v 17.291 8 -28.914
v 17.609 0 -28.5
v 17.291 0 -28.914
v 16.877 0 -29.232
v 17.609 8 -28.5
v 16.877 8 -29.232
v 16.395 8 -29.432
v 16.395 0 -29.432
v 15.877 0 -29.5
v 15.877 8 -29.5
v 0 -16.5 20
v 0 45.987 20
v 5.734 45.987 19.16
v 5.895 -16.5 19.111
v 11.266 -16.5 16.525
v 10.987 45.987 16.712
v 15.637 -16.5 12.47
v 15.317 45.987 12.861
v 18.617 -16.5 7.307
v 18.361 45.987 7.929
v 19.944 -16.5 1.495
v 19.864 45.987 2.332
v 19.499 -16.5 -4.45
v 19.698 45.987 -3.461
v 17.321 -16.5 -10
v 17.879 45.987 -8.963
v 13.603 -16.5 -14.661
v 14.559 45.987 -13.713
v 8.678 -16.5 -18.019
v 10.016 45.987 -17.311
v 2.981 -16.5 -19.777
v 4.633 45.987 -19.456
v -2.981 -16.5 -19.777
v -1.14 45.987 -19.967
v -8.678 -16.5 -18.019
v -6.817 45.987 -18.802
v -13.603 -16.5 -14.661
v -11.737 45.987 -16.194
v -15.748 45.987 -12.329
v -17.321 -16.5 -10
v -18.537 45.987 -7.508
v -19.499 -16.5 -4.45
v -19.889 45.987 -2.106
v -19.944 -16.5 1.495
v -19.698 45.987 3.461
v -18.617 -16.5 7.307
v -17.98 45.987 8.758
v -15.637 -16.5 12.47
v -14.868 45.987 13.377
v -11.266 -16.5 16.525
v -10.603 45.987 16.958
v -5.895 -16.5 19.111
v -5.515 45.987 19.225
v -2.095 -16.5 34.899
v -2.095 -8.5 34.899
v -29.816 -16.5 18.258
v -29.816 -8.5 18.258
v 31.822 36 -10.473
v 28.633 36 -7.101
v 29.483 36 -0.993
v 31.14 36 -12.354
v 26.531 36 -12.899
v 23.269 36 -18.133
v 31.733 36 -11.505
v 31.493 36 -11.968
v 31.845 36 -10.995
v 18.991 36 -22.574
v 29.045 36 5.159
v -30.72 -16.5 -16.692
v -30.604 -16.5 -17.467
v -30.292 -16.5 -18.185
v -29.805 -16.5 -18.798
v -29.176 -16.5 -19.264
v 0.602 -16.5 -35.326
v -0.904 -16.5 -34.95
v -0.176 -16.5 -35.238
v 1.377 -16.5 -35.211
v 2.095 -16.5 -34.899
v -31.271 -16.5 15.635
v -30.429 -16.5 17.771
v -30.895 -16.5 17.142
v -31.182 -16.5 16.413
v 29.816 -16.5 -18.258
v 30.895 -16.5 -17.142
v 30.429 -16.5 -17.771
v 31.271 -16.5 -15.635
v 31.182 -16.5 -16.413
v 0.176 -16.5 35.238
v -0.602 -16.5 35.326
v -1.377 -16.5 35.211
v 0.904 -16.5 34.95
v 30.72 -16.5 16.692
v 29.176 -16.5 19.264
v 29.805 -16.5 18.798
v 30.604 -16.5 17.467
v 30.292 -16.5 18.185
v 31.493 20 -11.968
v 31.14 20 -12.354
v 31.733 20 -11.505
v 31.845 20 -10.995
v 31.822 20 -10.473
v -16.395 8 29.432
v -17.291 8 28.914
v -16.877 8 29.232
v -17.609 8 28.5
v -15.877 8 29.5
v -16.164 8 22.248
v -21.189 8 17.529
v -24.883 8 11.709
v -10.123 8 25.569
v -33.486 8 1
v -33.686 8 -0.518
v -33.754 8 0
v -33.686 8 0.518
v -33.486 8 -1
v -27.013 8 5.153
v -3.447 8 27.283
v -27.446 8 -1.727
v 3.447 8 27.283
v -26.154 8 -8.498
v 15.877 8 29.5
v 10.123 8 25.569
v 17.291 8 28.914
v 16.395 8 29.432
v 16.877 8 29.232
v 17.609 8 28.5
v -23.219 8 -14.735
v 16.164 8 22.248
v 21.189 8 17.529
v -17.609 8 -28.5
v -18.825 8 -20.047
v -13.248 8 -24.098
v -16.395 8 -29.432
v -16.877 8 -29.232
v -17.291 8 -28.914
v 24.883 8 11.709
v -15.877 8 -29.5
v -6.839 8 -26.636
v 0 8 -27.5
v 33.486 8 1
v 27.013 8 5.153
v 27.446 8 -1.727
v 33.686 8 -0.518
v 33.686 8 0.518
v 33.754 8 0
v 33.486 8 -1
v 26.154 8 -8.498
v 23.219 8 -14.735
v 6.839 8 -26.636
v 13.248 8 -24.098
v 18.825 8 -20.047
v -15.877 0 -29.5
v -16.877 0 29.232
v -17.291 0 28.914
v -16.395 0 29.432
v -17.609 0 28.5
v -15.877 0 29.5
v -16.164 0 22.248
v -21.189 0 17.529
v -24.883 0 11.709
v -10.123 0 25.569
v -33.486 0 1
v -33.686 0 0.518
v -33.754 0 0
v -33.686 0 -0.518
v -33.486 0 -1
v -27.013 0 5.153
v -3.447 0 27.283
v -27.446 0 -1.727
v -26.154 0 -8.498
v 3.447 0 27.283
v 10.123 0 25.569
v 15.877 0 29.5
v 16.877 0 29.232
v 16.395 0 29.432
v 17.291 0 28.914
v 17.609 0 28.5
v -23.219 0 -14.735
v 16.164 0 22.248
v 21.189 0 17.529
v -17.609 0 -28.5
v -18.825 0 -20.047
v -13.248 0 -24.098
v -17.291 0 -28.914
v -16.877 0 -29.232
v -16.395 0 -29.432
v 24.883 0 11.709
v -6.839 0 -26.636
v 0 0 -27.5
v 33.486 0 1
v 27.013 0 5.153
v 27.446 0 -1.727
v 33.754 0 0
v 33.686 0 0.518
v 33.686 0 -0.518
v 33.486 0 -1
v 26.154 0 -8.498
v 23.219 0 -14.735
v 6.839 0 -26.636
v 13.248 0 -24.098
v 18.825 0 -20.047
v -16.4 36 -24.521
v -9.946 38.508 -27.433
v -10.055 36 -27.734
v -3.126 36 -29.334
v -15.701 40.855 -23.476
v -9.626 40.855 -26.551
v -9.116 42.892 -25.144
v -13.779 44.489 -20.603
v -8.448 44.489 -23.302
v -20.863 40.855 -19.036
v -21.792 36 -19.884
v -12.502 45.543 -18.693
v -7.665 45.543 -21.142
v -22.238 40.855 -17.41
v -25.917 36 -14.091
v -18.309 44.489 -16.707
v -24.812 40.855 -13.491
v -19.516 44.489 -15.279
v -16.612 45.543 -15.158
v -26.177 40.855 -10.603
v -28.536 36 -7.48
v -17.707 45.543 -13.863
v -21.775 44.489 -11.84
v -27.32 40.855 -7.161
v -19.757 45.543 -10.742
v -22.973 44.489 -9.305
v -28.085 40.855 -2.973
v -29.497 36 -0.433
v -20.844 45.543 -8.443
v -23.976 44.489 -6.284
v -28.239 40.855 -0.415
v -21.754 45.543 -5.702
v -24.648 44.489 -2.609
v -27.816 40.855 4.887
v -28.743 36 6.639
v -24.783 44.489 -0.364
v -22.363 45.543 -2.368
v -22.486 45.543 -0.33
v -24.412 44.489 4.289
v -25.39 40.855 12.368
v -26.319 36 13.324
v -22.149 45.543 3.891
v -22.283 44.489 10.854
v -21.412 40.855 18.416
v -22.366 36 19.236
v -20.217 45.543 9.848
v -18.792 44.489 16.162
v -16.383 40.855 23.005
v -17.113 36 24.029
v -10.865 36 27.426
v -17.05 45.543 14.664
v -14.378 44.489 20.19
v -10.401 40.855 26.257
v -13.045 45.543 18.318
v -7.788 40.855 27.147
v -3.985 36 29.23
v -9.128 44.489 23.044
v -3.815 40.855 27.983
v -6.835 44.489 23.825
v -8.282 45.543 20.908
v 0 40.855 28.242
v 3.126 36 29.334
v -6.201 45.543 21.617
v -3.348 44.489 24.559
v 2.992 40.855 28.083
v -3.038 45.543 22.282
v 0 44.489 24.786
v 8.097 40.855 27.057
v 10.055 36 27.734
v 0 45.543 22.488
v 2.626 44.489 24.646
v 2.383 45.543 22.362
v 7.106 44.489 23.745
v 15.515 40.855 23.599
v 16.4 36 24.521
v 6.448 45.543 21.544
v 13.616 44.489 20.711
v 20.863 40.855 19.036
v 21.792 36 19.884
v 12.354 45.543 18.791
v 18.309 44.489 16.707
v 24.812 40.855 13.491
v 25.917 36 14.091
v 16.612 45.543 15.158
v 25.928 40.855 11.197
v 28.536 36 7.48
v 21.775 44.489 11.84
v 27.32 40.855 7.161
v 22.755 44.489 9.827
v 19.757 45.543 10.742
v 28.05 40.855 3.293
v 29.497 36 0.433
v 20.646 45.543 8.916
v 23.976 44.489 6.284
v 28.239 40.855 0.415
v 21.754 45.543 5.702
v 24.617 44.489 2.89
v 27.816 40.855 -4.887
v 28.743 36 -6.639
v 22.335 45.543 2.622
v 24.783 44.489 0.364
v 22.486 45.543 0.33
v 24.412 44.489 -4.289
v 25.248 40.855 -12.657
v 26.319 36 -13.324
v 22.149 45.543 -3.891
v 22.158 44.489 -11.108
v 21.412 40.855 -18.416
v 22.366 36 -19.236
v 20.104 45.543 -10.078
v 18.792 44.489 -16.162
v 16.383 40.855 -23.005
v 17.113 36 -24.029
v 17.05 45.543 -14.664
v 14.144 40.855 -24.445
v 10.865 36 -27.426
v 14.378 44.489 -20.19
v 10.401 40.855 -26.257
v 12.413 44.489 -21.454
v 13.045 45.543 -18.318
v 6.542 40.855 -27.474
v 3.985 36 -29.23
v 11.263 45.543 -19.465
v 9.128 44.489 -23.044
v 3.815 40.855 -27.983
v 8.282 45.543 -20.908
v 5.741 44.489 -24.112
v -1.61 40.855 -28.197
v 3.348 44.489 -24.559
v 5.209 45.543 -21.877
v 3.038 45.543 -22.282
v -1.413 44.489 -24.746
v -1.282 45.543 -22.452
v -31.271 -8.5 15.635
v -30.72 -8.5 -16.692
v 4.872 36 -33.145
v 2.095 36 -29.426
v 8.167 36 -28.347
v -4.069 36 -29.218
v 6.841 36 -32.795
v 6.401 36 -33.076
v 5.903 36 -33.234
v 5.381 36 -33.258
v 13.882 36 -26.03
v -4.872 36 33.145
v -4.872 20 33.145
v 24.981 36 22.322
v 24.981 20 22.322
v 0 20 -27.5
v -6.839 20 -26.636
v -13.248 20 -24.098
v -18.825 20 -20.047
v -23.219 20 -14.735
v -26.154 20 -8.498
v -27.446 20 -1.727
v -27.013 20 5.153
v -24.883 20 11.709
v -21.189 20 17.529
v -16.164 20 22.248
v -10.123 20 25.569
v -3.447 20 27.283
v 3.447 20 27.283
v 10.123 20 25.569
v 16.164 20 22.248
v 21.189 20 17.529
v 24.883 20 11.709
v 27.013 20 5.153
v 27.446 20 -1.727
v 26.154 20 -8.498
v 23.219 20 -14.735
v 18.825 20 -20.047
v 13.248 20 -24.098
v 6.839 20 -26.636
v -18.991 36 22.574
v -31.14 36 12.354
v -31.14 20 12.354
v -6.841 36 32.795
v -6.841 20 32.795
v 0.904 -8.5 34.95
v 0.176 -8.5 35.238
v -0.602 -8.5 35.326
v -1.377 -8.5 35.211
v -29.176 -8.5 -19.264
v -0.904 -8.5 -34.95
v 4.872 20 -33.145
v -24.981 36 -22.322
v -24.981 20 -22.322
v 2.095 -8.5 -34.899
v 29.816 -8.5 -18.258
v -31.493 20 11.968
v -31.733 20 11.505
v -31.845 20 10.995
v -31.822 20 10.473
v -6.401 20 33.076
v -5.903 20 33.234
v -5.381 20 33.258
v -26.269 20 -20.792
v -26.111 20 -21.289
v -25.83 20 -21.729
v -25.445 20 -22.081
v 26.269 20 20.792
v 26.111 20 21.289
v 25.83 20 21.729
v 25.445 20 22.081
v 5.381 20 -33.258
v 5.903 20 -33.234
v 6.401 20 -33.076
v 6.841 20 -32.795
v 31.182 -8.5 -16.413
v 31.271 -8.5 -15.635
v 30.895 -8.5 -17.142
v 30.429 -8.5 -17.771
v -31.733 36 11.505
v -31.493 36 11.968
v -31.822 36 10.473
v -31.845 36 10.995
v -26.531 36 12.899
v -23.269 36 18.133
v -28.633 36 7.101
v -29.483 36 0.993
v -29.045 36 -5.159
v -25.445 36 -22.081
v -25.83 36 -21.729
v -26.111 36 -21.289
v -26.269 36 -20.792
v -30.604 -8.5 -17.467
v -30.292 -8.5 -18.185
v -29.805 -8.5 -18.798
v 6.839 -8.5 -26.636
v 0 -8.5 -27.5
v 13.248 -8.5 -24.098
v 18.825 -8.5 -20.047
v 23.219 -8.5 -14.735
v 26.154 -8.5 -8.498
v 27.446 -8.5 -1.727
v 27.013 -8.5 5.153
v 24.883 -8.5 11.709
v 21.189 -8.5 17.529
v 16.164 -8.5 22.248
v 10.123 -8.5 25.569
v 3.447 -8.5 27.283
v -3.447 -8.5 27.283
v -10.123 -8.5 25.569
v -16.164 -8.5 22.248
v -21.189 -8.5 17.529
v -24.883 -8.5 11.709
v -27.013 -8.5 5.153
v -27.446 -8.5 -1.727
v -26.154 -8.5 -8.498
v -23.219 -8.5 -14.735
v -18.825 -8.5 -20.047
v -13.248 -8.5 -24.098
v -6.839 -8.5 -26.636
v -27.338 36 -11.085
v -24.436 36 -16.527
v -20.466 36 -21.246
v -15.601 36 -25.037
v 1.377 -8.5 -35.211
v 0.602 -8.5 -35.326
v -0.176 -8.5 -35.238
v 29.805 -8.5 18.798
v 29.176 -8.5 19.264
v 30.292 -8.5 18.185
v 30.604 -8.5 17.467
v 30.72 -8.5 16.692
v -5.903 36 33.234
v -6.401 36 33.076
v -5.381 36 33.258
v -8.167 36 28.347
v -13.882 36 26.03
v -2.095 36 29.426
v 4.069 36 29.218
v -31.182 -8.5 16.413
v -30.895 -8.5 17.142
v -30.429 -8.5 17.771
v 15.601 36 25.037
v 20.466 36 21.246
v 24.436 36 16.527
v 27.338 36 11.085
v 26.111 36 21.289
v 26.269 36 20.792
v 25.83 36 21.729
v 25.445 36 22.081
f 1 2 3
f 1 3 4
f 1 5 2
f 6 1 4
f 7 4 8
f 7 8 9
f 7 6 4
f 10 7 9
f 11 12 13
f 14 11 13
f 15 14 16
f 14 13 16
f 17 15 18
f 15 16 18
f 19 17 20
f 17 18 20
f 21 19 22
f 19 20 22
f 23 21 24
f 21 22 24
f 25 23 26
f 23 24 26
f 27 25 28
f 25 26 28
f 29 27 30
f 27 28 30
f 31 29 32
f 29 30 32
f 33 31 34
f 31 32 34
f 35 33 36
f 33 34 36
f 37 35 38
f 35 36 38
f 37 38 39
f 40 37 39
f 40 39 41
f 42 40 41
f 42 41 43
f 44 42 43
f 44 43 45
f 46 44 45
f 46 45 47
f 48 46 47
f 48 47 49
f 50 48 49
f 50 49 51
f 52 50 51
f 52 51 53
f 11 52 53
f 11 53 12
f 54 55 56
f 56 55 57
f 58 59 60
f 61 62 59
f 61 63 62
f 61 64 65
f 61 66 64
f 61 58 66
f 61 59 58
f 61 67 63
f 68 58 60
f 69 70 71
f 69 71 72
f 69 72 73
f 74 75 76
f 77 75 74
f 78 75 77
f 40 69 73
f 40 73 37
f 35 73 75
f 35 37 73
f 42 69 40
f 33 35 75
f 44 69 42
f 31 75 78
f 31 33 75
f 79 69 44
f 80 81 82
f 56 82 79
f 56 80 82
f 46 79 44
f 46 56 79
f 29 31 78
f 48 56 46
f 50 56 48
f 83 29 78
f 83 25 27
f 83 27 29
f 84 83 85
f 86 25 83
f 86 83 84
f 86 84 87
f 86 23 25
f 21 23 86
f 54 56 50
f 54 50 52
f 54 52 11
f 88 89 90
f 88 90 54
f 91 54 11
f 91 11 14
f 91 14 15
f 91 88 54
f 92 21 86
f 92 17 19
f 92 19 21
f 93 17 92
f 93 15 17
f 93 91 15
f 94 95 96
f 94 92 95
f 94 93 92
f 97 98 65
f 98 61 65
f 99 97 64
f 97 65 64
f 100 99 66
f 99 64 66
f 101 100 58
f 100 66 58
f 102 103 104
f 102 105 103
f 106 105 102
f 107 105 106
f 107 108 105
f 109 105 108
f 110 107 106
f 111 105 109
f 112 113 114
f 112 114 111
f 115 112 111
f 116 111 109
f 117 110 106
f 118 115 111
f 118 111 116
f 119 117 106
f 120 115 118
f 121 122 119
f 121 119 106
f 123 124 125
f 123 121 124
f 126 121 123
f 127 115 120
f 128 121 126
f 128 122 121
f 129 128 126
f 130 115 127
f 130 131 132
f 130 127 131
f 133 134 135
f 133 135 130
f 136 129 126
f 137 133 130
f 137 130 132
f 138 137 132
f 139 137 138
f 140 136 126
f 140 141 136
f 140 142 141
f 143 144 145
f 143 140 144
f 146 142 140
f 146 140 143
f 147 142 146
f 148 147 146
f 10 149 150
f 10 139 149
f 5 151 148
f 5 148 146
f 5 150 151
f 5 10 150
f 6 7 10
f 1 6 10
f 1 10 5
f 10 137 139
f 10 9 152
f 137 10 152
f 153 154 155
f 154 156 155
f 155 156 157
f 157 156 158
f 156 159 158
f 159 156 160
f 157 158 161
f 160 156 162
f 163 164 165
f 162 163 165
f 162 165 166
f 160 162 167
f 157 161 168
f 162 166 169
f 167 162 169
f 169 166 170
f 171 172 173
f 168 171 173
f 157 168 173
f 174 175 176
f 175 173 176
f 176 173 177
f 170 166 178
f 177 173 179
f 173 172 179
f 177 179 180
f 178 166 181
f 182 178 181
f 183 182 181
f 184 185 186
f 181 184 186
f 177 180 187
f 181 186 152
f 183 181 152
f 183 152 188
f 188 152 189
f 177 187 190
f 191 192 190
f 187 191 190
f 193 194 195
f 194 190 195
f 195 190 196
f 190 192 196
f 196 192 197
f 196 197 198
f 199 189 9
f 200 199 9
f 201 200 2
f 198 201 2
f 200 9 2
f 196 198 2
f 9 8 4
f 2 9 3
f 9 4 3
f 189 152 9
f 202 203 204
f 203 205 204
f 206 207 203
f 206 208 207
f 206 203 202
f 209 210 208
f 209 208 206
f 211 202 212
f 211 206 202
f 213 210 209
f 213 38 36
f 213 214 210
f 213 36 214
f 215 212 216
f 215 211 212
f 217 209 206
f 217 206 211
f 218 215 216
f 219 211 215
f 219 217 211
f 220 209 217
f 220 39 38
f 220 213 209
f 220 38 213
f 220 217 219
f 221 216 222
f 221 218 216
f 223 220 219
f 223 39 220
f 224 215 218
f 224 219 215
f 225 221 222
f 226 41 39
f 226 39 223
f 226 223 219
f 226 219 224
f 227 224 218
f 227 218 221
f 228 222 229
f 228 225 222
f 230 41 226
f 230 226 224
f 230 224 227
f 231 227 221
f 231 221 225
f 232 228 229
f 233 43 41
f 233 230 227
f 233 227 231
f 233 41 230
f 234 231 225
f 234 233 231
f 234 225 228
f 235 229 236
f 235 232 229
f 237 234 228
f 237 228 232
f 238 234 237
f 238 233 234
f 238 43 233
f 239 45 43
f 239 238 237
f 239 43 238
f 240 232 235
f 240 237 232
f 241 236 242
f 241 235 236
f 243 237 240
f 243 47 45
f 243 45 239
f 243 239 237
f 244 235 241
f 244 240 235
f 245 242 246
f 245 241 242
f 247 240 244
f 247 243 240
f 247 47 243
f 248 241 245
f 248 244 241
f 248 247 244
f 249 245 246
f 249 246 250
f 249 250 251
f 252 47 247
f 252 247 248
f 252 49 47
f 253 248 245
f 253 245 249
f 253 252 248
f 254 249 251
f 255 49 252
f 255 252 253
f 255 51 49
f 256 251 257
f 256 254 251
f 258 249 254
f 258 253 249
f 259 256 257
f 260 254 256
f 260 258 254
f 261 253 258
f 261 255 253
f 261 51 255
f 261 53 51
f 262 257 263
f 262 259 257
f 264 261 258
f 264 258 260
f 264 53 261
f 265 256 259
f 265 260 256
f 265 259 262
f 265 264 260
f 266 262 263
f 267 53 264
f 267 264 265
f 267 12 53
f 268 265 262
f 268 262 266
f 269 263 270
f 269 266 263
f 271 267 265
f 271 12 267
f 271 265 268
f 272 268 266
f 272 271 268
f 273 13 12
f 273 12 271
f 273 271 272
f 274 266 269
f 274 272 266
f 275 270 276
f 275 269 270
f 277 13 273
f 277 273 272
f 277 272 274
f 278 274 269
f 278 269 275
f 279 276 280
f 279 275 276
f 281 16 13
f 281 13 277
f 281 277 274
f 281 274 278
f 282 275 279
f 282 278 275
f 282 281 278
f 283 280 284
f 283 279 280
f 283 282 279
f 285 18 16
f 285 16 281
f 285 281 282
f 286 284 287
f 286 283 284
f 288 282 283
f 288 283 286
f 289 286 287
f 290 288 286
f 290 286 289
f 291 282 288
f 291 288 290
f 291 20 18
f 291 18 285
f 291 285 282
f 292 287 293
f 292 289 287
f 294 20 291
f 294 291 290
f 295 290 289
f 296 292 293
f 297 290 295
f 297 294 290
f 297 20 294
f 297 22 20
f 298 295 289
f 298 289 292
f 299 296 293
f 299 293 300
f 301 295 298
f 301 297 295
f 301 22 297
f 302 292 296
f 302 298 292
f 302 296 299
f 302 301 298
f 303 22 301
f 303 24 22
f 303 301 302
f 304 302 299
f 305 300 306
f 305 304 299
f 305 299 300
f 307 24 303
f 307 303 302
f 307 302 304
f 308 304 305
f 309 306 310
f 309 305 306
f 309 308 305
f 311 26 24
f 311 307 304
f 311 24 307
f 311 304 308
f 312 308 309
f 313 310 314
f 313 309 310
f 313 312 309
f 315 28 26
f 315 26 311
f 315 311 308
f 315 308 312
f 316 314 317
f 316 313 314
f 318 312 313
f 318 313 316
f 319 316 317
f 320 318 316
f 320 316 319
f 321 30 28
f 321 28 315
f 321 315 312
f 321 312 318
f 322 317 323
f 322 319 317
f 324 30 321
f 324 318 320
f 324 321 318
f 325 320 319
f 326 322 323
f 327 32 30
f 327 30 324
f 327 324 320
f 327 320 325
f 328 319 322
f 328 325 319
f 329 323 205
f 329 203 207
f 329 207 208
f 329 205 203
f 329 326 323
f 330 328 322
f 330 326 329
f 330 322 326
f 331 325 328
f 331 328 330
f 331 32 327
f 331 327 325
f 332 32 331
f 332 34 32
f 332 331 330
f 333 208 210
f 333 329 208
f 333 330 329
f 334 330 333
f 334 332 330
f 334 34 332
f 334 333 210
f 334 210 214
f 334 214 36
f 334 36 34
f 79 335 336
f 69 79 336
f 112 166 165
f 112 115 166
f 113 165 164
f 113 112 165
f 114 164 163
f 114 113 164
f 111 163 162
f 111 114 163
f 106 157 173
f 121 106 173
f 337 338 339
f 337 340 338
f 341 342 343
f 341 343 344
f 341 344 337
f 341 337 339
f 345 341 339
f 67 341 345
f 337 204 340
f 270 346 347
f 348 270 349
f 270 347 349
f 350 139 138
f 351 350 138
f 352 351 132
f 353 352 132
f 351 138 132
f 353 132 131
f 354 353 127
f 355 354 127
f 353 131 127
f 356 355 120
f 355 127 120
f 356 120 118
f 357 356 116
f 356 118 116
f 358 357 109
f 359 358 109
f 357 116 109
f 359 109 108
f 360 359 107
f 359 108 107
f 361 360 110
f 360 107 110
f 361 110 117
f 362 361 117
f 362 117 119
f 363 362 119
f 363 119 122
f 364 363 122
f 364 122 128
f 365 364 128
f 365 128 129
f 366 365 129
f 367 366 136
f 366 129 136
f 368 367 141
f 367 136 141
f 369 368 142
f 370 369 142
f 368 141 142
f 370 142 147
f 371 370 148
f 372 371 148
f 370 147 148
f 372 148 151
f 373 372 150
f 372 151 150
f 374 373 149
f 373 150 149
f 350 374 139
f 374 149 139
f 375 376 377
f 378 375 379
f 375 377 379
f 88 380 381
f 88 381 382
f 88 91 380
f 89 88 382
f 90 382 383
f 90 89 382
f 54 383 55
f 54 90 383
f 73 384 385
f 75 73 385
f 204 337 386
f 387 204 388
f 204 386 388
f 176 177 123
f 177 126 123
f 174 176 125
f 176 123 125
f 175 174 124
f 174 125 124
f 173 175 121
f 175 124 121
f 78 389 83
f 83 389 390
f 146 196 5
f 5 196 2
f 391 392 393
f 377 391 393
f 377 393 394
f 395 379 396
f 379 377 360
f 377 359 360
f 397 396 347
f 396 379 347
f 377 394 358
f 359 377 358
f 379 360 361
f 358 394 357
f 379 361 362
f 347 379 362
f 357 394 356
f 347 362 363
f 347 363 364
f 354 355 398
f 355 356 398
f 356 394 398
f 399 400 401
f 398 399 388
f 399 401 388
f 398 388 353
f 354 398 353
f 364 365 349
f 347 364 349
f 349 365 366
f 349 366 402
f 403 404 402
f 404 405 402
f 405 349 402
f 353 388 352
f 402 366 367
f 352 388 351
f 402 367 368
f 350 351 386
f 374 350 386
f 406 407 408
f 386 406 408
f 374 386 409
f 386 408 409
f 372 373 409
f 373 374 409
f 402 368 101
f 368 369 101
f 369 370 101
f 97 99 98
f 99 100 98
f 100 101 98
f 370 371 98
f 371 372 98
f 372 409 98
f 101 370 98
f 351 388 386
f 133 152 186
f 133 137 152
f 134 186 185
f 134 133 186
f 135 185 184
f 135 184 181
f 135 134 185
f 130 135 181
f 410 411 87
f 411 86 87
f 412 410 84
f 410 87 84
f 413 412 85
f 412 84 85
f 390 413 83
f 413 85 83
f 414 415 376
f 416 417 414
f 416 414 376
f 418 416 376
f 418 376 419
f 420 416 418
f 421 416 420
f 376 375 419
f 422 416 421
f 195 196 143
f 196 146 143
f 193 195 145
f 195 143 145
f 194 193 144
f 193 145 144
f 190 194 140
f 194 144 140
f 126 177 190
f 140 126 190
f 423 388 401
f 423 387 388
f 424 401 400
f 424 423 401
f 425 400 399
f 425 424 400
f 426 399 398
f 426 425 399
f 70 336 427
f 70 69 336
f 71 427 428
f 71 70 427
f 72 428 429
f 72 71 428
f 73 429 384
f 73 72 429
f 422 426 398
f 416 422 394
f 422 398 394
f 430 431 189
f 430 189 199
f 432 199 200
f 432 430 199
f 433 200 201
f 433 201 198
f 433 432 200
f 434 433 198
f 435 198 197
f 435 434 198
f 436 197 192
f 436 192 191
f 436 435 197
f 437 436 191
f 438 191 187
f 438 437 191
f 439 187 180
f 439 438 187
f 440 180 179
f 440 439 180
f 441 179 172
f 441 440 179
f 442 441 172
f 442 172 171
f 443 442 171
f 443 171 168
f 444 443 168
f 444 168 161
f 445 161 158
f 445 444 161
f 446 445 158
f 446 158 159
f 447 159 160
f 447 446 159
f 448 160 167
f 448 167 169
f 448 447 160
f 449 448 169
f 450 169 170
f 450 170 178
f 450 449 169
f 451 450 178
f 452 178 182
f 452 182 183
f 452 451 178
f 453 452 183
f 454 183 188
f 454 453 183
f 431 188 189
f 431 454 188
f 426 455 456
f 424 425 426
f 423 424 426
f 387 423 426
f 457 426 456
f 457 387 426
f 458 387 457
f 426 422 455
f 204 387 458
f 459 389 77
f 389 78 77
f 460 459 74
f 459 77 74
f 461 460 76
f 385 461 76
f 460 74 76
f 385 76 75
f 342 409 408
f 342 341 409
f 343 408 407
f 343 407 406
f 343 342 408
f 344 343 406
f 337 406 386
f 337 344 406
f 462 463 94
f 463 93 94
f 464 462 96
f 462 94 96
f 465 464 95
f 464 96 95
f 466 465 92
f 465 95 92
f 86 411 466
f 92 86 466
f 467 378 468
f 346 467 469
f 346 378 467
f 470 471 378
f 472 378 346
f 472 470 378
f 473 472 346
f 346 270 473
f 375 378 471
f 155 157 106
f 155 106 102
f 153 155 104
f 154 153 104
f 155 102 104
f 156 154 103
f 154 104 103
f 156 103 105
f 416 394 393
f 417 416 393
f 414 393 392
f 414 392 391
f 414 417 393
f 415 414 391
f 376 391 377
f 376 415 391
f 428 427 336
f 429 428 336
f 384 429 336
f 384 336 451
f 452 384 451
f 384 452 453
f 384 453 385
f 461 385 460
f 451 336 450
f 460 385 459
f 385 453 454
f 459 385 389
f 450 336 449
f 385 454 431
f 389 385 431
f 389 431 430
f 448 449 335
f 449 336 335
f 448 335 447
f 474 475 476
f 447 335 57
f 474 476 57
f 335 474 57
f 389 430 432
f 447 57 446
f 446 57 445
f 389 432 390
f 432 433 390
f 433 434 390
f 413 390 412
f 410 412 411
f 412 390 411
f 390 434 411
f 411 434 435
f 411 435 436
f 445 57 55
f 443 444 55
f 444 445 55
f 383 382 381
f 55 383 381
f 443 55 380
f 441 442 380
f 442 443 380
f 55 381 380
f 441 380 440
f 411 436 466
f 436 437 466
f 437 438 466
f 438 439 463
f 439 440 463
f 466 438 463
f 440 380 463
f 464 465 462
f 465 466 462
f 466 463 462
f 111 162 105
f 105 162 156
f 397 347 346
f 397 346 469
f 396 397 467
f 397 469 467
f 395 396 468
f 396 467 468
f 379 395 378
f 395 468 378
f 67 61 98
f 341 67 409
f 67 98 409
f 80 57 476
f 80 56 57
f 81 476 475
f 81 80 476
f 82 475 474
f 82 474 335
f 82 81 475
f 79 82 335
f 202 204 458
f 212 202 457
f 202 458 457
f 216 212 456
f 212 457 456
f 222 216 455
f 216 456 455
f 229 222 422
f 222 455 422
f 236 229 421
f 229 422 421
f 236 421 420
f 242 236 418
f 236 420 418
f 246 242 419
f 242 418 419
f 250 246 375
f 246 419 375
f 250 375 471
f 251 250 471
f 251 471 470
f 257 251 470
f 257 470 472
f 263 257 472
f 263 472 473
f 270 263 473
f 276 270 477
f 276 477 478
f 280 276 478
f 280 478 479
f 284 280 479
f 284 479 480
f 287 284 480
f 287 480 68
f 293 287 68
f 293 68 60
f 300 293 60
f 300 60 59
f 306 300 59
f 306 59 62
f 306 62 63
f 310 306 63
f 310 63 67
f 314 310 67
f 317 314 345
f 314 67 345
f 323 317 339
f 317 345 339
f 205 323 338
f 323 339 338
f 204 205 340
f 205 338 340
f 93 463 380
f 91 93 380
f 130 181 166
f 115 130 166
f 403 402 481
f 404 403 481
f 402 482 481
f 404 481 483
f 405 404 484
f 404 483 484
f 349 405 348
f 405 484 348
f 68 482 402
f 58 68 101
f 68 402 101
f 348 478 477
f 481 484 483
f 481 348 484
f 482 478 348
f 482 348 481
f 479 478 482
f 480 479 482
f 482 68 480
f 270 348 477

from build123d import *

# Parameters (mm, degrees)
EXTRUDE_1_DEPTH     = 8
SKETCH_2_R          = 27.5
EXTRUDE_2_DEPTH     = 12
EXTRUDE_3_DEPTH     = 16
SKETCH_4_R          = 29.5
EXTRUDE_4_DEPTH     = 10
FILLET_1_R          = 10
EXTRUDE_START       = 8.5
SKETCH_5_R          = 27.5
EXTRUDE_5_DEPTH     = 8.5
EXTRUDE_6_DEPTH     = 8
SKETCH_7_R          = 20
CUT_EXTRUDE_1_DEPTH = 80.671476808
FILLET_2_R          = 2
FILLET_3_R          = 2
FILLET_4_R          = 3


with BuildPart() as part:
    # Эскиз1 → Вытянуть1 (new body)
    with BuildSketch(Plane(origin=(0, 0, 0), x_dir=(1, 0, 0), z_dir=(0, 1, 0))):
        Polygon((34.063665882, 0), (17.031832941, 29.5), (-17.031832941, 29.5), (-34.063665882, 0), (-17.031832941, -29.5), (17.031832941, -29.5), align=None)
    extrude(amount=EXTRUDE_1_DEPTH)

    # Эскиз2 → Вытянуть2 (add)
    with BuildSketch(Plane(origin=(0, 8, 0), x_dir=(1, 0, 0), z_dir=(0, 1, 0))):
        with Locations(Location((0, 0, 0), (0, 0, 90))):
            Circle(SKETCH_2_R)
    extrude(amount=EXTRUDE_2_DEPTH)

    # Эскиз3 → Вытянуть3 (add)
    with BuildSketch(Plane(origin=(0, 20, 0), x_dir=(1, 0, 0), z_dir=(0, 1, 0))):
        Polygon((5.957184122, 33.538713313), (-26.066785678, 21.928429441), (-32.0239698, -11.610283872), (-5.957184122, -33.538713313), (26.066785678, -21.928429441), (32.0239698, 11.610283872), align=None)
    extrude(amount=EXTRUDE_3_DEPTH)

    # Эскиз4 → Вытянуть4 (add)
    with BuildSketch(Plane(origin=(0, 36, 0), x_dir=(1, 0, 0), z_dir=(0, 1, 0))):
        with Locations(Location((0, 0, 0), (0, 0, 109.92810259))):
            Circle(SKETCH_4_R)
    extrude(amount=EXTRUDE_4_DEPTH)

    # Скругление1
    fillet_1_edges = [part.edges().sort_by_distance(p)[0] for p in [
        (10.054800778, 46, 27.733571377),
    ]]
    fillet(fillet_1_edges, radius=FILLET_1_R - 0.0001)  # a hair under: the kernel refuses the full size

    # Эскиз5 → Вытянуть5 (add)
    with BuildSketch(Plane.XZ.offset(EXTRUDE_START)):
        with Locations(Location((0, 0, 0), (0, 0, 270))):
            Circle(SKETCH_5_R)
    extrude(amount=-EXTRUDE_5_DEPTH)

    # Эскиз6 → Вытянуть6 (add)
    with BuildSketch(Plane.XZ.offset(8.5)):
        Polygon((30.690350843, 18.423780786), (-0.610286773, 35.790513874), (-31.300637616, 17.366733088), (-30.690350843, -18.423780786), (0.610286773, -35.790513874), (31.300637616, -17.366733088), align=None)
    extrude(amount=EXTRUDE_6_DEPTH)

    # Эскиз7 → Вырез-Вытянуть1 (cut, through all)
    with BuildSketch(Plane(origin=(0, 46, 0), x_dir=(1, 0, 0), z_dir=(0, 1, 0))):
        with Locations(Location((0, 0, 0), (0, 0, 270))):
            Circle(SKETCH_7_R)
    extrude(amount=-CUT_EXTRUDE_1_DEPTH, mode=Mode.SUBTRACT)

    # Скругление2
    fillet_2_edges = [part.edges().sort_by_distance(p)[0] for p in [
        (32.0239698, 28, -11.610283872),
        (5.957184122, 28, -33.538713313),
        (-26.066785678, 28, -21.928429441),
        (-32.0239698, 28, 11.610283872),
        (-5.957184122, 28, 33.538713313),
        (26.066785678, 28, 21.928429441),
    ]]
    fillet(fillet_2_edges, radius=FILLET_2_R)

    # Скругление3
    fillet_3_edges = [part.edges().sort_by_distance(p)[0] for p in [
        (17.031832941, 4, 29.5),
        (-17.031832941, 4, 29.5),
        (-34.063665882, 4, 0),
        (-17.031832941, 4, -29.5),
        (17.031832941, 4, -29.5),
        (34.063665882, 4, 0),
    ]]
    fillet(fillet_3_edges, radius=FILLET_3_R)

    # Скругление4
    fillet_4_edges = [part.edges().sort_by_distance(p)[0] for p in [
        (31.300637616, -12.5, -17.366733088),
        (30.690350843, -12.5, 18.423780786),
        (-0.610286773, -12.5, 35.790513874),
        (-31.300637616, -12.5, 17.366733088),
        (-30.690350843, -12.5, -18.423780786),
        (0.610286773, -12.5, -35.790513874),
    ]]
    fillet(fillet_4_edges, radius=FILLET_4_R)


solid = part.part
